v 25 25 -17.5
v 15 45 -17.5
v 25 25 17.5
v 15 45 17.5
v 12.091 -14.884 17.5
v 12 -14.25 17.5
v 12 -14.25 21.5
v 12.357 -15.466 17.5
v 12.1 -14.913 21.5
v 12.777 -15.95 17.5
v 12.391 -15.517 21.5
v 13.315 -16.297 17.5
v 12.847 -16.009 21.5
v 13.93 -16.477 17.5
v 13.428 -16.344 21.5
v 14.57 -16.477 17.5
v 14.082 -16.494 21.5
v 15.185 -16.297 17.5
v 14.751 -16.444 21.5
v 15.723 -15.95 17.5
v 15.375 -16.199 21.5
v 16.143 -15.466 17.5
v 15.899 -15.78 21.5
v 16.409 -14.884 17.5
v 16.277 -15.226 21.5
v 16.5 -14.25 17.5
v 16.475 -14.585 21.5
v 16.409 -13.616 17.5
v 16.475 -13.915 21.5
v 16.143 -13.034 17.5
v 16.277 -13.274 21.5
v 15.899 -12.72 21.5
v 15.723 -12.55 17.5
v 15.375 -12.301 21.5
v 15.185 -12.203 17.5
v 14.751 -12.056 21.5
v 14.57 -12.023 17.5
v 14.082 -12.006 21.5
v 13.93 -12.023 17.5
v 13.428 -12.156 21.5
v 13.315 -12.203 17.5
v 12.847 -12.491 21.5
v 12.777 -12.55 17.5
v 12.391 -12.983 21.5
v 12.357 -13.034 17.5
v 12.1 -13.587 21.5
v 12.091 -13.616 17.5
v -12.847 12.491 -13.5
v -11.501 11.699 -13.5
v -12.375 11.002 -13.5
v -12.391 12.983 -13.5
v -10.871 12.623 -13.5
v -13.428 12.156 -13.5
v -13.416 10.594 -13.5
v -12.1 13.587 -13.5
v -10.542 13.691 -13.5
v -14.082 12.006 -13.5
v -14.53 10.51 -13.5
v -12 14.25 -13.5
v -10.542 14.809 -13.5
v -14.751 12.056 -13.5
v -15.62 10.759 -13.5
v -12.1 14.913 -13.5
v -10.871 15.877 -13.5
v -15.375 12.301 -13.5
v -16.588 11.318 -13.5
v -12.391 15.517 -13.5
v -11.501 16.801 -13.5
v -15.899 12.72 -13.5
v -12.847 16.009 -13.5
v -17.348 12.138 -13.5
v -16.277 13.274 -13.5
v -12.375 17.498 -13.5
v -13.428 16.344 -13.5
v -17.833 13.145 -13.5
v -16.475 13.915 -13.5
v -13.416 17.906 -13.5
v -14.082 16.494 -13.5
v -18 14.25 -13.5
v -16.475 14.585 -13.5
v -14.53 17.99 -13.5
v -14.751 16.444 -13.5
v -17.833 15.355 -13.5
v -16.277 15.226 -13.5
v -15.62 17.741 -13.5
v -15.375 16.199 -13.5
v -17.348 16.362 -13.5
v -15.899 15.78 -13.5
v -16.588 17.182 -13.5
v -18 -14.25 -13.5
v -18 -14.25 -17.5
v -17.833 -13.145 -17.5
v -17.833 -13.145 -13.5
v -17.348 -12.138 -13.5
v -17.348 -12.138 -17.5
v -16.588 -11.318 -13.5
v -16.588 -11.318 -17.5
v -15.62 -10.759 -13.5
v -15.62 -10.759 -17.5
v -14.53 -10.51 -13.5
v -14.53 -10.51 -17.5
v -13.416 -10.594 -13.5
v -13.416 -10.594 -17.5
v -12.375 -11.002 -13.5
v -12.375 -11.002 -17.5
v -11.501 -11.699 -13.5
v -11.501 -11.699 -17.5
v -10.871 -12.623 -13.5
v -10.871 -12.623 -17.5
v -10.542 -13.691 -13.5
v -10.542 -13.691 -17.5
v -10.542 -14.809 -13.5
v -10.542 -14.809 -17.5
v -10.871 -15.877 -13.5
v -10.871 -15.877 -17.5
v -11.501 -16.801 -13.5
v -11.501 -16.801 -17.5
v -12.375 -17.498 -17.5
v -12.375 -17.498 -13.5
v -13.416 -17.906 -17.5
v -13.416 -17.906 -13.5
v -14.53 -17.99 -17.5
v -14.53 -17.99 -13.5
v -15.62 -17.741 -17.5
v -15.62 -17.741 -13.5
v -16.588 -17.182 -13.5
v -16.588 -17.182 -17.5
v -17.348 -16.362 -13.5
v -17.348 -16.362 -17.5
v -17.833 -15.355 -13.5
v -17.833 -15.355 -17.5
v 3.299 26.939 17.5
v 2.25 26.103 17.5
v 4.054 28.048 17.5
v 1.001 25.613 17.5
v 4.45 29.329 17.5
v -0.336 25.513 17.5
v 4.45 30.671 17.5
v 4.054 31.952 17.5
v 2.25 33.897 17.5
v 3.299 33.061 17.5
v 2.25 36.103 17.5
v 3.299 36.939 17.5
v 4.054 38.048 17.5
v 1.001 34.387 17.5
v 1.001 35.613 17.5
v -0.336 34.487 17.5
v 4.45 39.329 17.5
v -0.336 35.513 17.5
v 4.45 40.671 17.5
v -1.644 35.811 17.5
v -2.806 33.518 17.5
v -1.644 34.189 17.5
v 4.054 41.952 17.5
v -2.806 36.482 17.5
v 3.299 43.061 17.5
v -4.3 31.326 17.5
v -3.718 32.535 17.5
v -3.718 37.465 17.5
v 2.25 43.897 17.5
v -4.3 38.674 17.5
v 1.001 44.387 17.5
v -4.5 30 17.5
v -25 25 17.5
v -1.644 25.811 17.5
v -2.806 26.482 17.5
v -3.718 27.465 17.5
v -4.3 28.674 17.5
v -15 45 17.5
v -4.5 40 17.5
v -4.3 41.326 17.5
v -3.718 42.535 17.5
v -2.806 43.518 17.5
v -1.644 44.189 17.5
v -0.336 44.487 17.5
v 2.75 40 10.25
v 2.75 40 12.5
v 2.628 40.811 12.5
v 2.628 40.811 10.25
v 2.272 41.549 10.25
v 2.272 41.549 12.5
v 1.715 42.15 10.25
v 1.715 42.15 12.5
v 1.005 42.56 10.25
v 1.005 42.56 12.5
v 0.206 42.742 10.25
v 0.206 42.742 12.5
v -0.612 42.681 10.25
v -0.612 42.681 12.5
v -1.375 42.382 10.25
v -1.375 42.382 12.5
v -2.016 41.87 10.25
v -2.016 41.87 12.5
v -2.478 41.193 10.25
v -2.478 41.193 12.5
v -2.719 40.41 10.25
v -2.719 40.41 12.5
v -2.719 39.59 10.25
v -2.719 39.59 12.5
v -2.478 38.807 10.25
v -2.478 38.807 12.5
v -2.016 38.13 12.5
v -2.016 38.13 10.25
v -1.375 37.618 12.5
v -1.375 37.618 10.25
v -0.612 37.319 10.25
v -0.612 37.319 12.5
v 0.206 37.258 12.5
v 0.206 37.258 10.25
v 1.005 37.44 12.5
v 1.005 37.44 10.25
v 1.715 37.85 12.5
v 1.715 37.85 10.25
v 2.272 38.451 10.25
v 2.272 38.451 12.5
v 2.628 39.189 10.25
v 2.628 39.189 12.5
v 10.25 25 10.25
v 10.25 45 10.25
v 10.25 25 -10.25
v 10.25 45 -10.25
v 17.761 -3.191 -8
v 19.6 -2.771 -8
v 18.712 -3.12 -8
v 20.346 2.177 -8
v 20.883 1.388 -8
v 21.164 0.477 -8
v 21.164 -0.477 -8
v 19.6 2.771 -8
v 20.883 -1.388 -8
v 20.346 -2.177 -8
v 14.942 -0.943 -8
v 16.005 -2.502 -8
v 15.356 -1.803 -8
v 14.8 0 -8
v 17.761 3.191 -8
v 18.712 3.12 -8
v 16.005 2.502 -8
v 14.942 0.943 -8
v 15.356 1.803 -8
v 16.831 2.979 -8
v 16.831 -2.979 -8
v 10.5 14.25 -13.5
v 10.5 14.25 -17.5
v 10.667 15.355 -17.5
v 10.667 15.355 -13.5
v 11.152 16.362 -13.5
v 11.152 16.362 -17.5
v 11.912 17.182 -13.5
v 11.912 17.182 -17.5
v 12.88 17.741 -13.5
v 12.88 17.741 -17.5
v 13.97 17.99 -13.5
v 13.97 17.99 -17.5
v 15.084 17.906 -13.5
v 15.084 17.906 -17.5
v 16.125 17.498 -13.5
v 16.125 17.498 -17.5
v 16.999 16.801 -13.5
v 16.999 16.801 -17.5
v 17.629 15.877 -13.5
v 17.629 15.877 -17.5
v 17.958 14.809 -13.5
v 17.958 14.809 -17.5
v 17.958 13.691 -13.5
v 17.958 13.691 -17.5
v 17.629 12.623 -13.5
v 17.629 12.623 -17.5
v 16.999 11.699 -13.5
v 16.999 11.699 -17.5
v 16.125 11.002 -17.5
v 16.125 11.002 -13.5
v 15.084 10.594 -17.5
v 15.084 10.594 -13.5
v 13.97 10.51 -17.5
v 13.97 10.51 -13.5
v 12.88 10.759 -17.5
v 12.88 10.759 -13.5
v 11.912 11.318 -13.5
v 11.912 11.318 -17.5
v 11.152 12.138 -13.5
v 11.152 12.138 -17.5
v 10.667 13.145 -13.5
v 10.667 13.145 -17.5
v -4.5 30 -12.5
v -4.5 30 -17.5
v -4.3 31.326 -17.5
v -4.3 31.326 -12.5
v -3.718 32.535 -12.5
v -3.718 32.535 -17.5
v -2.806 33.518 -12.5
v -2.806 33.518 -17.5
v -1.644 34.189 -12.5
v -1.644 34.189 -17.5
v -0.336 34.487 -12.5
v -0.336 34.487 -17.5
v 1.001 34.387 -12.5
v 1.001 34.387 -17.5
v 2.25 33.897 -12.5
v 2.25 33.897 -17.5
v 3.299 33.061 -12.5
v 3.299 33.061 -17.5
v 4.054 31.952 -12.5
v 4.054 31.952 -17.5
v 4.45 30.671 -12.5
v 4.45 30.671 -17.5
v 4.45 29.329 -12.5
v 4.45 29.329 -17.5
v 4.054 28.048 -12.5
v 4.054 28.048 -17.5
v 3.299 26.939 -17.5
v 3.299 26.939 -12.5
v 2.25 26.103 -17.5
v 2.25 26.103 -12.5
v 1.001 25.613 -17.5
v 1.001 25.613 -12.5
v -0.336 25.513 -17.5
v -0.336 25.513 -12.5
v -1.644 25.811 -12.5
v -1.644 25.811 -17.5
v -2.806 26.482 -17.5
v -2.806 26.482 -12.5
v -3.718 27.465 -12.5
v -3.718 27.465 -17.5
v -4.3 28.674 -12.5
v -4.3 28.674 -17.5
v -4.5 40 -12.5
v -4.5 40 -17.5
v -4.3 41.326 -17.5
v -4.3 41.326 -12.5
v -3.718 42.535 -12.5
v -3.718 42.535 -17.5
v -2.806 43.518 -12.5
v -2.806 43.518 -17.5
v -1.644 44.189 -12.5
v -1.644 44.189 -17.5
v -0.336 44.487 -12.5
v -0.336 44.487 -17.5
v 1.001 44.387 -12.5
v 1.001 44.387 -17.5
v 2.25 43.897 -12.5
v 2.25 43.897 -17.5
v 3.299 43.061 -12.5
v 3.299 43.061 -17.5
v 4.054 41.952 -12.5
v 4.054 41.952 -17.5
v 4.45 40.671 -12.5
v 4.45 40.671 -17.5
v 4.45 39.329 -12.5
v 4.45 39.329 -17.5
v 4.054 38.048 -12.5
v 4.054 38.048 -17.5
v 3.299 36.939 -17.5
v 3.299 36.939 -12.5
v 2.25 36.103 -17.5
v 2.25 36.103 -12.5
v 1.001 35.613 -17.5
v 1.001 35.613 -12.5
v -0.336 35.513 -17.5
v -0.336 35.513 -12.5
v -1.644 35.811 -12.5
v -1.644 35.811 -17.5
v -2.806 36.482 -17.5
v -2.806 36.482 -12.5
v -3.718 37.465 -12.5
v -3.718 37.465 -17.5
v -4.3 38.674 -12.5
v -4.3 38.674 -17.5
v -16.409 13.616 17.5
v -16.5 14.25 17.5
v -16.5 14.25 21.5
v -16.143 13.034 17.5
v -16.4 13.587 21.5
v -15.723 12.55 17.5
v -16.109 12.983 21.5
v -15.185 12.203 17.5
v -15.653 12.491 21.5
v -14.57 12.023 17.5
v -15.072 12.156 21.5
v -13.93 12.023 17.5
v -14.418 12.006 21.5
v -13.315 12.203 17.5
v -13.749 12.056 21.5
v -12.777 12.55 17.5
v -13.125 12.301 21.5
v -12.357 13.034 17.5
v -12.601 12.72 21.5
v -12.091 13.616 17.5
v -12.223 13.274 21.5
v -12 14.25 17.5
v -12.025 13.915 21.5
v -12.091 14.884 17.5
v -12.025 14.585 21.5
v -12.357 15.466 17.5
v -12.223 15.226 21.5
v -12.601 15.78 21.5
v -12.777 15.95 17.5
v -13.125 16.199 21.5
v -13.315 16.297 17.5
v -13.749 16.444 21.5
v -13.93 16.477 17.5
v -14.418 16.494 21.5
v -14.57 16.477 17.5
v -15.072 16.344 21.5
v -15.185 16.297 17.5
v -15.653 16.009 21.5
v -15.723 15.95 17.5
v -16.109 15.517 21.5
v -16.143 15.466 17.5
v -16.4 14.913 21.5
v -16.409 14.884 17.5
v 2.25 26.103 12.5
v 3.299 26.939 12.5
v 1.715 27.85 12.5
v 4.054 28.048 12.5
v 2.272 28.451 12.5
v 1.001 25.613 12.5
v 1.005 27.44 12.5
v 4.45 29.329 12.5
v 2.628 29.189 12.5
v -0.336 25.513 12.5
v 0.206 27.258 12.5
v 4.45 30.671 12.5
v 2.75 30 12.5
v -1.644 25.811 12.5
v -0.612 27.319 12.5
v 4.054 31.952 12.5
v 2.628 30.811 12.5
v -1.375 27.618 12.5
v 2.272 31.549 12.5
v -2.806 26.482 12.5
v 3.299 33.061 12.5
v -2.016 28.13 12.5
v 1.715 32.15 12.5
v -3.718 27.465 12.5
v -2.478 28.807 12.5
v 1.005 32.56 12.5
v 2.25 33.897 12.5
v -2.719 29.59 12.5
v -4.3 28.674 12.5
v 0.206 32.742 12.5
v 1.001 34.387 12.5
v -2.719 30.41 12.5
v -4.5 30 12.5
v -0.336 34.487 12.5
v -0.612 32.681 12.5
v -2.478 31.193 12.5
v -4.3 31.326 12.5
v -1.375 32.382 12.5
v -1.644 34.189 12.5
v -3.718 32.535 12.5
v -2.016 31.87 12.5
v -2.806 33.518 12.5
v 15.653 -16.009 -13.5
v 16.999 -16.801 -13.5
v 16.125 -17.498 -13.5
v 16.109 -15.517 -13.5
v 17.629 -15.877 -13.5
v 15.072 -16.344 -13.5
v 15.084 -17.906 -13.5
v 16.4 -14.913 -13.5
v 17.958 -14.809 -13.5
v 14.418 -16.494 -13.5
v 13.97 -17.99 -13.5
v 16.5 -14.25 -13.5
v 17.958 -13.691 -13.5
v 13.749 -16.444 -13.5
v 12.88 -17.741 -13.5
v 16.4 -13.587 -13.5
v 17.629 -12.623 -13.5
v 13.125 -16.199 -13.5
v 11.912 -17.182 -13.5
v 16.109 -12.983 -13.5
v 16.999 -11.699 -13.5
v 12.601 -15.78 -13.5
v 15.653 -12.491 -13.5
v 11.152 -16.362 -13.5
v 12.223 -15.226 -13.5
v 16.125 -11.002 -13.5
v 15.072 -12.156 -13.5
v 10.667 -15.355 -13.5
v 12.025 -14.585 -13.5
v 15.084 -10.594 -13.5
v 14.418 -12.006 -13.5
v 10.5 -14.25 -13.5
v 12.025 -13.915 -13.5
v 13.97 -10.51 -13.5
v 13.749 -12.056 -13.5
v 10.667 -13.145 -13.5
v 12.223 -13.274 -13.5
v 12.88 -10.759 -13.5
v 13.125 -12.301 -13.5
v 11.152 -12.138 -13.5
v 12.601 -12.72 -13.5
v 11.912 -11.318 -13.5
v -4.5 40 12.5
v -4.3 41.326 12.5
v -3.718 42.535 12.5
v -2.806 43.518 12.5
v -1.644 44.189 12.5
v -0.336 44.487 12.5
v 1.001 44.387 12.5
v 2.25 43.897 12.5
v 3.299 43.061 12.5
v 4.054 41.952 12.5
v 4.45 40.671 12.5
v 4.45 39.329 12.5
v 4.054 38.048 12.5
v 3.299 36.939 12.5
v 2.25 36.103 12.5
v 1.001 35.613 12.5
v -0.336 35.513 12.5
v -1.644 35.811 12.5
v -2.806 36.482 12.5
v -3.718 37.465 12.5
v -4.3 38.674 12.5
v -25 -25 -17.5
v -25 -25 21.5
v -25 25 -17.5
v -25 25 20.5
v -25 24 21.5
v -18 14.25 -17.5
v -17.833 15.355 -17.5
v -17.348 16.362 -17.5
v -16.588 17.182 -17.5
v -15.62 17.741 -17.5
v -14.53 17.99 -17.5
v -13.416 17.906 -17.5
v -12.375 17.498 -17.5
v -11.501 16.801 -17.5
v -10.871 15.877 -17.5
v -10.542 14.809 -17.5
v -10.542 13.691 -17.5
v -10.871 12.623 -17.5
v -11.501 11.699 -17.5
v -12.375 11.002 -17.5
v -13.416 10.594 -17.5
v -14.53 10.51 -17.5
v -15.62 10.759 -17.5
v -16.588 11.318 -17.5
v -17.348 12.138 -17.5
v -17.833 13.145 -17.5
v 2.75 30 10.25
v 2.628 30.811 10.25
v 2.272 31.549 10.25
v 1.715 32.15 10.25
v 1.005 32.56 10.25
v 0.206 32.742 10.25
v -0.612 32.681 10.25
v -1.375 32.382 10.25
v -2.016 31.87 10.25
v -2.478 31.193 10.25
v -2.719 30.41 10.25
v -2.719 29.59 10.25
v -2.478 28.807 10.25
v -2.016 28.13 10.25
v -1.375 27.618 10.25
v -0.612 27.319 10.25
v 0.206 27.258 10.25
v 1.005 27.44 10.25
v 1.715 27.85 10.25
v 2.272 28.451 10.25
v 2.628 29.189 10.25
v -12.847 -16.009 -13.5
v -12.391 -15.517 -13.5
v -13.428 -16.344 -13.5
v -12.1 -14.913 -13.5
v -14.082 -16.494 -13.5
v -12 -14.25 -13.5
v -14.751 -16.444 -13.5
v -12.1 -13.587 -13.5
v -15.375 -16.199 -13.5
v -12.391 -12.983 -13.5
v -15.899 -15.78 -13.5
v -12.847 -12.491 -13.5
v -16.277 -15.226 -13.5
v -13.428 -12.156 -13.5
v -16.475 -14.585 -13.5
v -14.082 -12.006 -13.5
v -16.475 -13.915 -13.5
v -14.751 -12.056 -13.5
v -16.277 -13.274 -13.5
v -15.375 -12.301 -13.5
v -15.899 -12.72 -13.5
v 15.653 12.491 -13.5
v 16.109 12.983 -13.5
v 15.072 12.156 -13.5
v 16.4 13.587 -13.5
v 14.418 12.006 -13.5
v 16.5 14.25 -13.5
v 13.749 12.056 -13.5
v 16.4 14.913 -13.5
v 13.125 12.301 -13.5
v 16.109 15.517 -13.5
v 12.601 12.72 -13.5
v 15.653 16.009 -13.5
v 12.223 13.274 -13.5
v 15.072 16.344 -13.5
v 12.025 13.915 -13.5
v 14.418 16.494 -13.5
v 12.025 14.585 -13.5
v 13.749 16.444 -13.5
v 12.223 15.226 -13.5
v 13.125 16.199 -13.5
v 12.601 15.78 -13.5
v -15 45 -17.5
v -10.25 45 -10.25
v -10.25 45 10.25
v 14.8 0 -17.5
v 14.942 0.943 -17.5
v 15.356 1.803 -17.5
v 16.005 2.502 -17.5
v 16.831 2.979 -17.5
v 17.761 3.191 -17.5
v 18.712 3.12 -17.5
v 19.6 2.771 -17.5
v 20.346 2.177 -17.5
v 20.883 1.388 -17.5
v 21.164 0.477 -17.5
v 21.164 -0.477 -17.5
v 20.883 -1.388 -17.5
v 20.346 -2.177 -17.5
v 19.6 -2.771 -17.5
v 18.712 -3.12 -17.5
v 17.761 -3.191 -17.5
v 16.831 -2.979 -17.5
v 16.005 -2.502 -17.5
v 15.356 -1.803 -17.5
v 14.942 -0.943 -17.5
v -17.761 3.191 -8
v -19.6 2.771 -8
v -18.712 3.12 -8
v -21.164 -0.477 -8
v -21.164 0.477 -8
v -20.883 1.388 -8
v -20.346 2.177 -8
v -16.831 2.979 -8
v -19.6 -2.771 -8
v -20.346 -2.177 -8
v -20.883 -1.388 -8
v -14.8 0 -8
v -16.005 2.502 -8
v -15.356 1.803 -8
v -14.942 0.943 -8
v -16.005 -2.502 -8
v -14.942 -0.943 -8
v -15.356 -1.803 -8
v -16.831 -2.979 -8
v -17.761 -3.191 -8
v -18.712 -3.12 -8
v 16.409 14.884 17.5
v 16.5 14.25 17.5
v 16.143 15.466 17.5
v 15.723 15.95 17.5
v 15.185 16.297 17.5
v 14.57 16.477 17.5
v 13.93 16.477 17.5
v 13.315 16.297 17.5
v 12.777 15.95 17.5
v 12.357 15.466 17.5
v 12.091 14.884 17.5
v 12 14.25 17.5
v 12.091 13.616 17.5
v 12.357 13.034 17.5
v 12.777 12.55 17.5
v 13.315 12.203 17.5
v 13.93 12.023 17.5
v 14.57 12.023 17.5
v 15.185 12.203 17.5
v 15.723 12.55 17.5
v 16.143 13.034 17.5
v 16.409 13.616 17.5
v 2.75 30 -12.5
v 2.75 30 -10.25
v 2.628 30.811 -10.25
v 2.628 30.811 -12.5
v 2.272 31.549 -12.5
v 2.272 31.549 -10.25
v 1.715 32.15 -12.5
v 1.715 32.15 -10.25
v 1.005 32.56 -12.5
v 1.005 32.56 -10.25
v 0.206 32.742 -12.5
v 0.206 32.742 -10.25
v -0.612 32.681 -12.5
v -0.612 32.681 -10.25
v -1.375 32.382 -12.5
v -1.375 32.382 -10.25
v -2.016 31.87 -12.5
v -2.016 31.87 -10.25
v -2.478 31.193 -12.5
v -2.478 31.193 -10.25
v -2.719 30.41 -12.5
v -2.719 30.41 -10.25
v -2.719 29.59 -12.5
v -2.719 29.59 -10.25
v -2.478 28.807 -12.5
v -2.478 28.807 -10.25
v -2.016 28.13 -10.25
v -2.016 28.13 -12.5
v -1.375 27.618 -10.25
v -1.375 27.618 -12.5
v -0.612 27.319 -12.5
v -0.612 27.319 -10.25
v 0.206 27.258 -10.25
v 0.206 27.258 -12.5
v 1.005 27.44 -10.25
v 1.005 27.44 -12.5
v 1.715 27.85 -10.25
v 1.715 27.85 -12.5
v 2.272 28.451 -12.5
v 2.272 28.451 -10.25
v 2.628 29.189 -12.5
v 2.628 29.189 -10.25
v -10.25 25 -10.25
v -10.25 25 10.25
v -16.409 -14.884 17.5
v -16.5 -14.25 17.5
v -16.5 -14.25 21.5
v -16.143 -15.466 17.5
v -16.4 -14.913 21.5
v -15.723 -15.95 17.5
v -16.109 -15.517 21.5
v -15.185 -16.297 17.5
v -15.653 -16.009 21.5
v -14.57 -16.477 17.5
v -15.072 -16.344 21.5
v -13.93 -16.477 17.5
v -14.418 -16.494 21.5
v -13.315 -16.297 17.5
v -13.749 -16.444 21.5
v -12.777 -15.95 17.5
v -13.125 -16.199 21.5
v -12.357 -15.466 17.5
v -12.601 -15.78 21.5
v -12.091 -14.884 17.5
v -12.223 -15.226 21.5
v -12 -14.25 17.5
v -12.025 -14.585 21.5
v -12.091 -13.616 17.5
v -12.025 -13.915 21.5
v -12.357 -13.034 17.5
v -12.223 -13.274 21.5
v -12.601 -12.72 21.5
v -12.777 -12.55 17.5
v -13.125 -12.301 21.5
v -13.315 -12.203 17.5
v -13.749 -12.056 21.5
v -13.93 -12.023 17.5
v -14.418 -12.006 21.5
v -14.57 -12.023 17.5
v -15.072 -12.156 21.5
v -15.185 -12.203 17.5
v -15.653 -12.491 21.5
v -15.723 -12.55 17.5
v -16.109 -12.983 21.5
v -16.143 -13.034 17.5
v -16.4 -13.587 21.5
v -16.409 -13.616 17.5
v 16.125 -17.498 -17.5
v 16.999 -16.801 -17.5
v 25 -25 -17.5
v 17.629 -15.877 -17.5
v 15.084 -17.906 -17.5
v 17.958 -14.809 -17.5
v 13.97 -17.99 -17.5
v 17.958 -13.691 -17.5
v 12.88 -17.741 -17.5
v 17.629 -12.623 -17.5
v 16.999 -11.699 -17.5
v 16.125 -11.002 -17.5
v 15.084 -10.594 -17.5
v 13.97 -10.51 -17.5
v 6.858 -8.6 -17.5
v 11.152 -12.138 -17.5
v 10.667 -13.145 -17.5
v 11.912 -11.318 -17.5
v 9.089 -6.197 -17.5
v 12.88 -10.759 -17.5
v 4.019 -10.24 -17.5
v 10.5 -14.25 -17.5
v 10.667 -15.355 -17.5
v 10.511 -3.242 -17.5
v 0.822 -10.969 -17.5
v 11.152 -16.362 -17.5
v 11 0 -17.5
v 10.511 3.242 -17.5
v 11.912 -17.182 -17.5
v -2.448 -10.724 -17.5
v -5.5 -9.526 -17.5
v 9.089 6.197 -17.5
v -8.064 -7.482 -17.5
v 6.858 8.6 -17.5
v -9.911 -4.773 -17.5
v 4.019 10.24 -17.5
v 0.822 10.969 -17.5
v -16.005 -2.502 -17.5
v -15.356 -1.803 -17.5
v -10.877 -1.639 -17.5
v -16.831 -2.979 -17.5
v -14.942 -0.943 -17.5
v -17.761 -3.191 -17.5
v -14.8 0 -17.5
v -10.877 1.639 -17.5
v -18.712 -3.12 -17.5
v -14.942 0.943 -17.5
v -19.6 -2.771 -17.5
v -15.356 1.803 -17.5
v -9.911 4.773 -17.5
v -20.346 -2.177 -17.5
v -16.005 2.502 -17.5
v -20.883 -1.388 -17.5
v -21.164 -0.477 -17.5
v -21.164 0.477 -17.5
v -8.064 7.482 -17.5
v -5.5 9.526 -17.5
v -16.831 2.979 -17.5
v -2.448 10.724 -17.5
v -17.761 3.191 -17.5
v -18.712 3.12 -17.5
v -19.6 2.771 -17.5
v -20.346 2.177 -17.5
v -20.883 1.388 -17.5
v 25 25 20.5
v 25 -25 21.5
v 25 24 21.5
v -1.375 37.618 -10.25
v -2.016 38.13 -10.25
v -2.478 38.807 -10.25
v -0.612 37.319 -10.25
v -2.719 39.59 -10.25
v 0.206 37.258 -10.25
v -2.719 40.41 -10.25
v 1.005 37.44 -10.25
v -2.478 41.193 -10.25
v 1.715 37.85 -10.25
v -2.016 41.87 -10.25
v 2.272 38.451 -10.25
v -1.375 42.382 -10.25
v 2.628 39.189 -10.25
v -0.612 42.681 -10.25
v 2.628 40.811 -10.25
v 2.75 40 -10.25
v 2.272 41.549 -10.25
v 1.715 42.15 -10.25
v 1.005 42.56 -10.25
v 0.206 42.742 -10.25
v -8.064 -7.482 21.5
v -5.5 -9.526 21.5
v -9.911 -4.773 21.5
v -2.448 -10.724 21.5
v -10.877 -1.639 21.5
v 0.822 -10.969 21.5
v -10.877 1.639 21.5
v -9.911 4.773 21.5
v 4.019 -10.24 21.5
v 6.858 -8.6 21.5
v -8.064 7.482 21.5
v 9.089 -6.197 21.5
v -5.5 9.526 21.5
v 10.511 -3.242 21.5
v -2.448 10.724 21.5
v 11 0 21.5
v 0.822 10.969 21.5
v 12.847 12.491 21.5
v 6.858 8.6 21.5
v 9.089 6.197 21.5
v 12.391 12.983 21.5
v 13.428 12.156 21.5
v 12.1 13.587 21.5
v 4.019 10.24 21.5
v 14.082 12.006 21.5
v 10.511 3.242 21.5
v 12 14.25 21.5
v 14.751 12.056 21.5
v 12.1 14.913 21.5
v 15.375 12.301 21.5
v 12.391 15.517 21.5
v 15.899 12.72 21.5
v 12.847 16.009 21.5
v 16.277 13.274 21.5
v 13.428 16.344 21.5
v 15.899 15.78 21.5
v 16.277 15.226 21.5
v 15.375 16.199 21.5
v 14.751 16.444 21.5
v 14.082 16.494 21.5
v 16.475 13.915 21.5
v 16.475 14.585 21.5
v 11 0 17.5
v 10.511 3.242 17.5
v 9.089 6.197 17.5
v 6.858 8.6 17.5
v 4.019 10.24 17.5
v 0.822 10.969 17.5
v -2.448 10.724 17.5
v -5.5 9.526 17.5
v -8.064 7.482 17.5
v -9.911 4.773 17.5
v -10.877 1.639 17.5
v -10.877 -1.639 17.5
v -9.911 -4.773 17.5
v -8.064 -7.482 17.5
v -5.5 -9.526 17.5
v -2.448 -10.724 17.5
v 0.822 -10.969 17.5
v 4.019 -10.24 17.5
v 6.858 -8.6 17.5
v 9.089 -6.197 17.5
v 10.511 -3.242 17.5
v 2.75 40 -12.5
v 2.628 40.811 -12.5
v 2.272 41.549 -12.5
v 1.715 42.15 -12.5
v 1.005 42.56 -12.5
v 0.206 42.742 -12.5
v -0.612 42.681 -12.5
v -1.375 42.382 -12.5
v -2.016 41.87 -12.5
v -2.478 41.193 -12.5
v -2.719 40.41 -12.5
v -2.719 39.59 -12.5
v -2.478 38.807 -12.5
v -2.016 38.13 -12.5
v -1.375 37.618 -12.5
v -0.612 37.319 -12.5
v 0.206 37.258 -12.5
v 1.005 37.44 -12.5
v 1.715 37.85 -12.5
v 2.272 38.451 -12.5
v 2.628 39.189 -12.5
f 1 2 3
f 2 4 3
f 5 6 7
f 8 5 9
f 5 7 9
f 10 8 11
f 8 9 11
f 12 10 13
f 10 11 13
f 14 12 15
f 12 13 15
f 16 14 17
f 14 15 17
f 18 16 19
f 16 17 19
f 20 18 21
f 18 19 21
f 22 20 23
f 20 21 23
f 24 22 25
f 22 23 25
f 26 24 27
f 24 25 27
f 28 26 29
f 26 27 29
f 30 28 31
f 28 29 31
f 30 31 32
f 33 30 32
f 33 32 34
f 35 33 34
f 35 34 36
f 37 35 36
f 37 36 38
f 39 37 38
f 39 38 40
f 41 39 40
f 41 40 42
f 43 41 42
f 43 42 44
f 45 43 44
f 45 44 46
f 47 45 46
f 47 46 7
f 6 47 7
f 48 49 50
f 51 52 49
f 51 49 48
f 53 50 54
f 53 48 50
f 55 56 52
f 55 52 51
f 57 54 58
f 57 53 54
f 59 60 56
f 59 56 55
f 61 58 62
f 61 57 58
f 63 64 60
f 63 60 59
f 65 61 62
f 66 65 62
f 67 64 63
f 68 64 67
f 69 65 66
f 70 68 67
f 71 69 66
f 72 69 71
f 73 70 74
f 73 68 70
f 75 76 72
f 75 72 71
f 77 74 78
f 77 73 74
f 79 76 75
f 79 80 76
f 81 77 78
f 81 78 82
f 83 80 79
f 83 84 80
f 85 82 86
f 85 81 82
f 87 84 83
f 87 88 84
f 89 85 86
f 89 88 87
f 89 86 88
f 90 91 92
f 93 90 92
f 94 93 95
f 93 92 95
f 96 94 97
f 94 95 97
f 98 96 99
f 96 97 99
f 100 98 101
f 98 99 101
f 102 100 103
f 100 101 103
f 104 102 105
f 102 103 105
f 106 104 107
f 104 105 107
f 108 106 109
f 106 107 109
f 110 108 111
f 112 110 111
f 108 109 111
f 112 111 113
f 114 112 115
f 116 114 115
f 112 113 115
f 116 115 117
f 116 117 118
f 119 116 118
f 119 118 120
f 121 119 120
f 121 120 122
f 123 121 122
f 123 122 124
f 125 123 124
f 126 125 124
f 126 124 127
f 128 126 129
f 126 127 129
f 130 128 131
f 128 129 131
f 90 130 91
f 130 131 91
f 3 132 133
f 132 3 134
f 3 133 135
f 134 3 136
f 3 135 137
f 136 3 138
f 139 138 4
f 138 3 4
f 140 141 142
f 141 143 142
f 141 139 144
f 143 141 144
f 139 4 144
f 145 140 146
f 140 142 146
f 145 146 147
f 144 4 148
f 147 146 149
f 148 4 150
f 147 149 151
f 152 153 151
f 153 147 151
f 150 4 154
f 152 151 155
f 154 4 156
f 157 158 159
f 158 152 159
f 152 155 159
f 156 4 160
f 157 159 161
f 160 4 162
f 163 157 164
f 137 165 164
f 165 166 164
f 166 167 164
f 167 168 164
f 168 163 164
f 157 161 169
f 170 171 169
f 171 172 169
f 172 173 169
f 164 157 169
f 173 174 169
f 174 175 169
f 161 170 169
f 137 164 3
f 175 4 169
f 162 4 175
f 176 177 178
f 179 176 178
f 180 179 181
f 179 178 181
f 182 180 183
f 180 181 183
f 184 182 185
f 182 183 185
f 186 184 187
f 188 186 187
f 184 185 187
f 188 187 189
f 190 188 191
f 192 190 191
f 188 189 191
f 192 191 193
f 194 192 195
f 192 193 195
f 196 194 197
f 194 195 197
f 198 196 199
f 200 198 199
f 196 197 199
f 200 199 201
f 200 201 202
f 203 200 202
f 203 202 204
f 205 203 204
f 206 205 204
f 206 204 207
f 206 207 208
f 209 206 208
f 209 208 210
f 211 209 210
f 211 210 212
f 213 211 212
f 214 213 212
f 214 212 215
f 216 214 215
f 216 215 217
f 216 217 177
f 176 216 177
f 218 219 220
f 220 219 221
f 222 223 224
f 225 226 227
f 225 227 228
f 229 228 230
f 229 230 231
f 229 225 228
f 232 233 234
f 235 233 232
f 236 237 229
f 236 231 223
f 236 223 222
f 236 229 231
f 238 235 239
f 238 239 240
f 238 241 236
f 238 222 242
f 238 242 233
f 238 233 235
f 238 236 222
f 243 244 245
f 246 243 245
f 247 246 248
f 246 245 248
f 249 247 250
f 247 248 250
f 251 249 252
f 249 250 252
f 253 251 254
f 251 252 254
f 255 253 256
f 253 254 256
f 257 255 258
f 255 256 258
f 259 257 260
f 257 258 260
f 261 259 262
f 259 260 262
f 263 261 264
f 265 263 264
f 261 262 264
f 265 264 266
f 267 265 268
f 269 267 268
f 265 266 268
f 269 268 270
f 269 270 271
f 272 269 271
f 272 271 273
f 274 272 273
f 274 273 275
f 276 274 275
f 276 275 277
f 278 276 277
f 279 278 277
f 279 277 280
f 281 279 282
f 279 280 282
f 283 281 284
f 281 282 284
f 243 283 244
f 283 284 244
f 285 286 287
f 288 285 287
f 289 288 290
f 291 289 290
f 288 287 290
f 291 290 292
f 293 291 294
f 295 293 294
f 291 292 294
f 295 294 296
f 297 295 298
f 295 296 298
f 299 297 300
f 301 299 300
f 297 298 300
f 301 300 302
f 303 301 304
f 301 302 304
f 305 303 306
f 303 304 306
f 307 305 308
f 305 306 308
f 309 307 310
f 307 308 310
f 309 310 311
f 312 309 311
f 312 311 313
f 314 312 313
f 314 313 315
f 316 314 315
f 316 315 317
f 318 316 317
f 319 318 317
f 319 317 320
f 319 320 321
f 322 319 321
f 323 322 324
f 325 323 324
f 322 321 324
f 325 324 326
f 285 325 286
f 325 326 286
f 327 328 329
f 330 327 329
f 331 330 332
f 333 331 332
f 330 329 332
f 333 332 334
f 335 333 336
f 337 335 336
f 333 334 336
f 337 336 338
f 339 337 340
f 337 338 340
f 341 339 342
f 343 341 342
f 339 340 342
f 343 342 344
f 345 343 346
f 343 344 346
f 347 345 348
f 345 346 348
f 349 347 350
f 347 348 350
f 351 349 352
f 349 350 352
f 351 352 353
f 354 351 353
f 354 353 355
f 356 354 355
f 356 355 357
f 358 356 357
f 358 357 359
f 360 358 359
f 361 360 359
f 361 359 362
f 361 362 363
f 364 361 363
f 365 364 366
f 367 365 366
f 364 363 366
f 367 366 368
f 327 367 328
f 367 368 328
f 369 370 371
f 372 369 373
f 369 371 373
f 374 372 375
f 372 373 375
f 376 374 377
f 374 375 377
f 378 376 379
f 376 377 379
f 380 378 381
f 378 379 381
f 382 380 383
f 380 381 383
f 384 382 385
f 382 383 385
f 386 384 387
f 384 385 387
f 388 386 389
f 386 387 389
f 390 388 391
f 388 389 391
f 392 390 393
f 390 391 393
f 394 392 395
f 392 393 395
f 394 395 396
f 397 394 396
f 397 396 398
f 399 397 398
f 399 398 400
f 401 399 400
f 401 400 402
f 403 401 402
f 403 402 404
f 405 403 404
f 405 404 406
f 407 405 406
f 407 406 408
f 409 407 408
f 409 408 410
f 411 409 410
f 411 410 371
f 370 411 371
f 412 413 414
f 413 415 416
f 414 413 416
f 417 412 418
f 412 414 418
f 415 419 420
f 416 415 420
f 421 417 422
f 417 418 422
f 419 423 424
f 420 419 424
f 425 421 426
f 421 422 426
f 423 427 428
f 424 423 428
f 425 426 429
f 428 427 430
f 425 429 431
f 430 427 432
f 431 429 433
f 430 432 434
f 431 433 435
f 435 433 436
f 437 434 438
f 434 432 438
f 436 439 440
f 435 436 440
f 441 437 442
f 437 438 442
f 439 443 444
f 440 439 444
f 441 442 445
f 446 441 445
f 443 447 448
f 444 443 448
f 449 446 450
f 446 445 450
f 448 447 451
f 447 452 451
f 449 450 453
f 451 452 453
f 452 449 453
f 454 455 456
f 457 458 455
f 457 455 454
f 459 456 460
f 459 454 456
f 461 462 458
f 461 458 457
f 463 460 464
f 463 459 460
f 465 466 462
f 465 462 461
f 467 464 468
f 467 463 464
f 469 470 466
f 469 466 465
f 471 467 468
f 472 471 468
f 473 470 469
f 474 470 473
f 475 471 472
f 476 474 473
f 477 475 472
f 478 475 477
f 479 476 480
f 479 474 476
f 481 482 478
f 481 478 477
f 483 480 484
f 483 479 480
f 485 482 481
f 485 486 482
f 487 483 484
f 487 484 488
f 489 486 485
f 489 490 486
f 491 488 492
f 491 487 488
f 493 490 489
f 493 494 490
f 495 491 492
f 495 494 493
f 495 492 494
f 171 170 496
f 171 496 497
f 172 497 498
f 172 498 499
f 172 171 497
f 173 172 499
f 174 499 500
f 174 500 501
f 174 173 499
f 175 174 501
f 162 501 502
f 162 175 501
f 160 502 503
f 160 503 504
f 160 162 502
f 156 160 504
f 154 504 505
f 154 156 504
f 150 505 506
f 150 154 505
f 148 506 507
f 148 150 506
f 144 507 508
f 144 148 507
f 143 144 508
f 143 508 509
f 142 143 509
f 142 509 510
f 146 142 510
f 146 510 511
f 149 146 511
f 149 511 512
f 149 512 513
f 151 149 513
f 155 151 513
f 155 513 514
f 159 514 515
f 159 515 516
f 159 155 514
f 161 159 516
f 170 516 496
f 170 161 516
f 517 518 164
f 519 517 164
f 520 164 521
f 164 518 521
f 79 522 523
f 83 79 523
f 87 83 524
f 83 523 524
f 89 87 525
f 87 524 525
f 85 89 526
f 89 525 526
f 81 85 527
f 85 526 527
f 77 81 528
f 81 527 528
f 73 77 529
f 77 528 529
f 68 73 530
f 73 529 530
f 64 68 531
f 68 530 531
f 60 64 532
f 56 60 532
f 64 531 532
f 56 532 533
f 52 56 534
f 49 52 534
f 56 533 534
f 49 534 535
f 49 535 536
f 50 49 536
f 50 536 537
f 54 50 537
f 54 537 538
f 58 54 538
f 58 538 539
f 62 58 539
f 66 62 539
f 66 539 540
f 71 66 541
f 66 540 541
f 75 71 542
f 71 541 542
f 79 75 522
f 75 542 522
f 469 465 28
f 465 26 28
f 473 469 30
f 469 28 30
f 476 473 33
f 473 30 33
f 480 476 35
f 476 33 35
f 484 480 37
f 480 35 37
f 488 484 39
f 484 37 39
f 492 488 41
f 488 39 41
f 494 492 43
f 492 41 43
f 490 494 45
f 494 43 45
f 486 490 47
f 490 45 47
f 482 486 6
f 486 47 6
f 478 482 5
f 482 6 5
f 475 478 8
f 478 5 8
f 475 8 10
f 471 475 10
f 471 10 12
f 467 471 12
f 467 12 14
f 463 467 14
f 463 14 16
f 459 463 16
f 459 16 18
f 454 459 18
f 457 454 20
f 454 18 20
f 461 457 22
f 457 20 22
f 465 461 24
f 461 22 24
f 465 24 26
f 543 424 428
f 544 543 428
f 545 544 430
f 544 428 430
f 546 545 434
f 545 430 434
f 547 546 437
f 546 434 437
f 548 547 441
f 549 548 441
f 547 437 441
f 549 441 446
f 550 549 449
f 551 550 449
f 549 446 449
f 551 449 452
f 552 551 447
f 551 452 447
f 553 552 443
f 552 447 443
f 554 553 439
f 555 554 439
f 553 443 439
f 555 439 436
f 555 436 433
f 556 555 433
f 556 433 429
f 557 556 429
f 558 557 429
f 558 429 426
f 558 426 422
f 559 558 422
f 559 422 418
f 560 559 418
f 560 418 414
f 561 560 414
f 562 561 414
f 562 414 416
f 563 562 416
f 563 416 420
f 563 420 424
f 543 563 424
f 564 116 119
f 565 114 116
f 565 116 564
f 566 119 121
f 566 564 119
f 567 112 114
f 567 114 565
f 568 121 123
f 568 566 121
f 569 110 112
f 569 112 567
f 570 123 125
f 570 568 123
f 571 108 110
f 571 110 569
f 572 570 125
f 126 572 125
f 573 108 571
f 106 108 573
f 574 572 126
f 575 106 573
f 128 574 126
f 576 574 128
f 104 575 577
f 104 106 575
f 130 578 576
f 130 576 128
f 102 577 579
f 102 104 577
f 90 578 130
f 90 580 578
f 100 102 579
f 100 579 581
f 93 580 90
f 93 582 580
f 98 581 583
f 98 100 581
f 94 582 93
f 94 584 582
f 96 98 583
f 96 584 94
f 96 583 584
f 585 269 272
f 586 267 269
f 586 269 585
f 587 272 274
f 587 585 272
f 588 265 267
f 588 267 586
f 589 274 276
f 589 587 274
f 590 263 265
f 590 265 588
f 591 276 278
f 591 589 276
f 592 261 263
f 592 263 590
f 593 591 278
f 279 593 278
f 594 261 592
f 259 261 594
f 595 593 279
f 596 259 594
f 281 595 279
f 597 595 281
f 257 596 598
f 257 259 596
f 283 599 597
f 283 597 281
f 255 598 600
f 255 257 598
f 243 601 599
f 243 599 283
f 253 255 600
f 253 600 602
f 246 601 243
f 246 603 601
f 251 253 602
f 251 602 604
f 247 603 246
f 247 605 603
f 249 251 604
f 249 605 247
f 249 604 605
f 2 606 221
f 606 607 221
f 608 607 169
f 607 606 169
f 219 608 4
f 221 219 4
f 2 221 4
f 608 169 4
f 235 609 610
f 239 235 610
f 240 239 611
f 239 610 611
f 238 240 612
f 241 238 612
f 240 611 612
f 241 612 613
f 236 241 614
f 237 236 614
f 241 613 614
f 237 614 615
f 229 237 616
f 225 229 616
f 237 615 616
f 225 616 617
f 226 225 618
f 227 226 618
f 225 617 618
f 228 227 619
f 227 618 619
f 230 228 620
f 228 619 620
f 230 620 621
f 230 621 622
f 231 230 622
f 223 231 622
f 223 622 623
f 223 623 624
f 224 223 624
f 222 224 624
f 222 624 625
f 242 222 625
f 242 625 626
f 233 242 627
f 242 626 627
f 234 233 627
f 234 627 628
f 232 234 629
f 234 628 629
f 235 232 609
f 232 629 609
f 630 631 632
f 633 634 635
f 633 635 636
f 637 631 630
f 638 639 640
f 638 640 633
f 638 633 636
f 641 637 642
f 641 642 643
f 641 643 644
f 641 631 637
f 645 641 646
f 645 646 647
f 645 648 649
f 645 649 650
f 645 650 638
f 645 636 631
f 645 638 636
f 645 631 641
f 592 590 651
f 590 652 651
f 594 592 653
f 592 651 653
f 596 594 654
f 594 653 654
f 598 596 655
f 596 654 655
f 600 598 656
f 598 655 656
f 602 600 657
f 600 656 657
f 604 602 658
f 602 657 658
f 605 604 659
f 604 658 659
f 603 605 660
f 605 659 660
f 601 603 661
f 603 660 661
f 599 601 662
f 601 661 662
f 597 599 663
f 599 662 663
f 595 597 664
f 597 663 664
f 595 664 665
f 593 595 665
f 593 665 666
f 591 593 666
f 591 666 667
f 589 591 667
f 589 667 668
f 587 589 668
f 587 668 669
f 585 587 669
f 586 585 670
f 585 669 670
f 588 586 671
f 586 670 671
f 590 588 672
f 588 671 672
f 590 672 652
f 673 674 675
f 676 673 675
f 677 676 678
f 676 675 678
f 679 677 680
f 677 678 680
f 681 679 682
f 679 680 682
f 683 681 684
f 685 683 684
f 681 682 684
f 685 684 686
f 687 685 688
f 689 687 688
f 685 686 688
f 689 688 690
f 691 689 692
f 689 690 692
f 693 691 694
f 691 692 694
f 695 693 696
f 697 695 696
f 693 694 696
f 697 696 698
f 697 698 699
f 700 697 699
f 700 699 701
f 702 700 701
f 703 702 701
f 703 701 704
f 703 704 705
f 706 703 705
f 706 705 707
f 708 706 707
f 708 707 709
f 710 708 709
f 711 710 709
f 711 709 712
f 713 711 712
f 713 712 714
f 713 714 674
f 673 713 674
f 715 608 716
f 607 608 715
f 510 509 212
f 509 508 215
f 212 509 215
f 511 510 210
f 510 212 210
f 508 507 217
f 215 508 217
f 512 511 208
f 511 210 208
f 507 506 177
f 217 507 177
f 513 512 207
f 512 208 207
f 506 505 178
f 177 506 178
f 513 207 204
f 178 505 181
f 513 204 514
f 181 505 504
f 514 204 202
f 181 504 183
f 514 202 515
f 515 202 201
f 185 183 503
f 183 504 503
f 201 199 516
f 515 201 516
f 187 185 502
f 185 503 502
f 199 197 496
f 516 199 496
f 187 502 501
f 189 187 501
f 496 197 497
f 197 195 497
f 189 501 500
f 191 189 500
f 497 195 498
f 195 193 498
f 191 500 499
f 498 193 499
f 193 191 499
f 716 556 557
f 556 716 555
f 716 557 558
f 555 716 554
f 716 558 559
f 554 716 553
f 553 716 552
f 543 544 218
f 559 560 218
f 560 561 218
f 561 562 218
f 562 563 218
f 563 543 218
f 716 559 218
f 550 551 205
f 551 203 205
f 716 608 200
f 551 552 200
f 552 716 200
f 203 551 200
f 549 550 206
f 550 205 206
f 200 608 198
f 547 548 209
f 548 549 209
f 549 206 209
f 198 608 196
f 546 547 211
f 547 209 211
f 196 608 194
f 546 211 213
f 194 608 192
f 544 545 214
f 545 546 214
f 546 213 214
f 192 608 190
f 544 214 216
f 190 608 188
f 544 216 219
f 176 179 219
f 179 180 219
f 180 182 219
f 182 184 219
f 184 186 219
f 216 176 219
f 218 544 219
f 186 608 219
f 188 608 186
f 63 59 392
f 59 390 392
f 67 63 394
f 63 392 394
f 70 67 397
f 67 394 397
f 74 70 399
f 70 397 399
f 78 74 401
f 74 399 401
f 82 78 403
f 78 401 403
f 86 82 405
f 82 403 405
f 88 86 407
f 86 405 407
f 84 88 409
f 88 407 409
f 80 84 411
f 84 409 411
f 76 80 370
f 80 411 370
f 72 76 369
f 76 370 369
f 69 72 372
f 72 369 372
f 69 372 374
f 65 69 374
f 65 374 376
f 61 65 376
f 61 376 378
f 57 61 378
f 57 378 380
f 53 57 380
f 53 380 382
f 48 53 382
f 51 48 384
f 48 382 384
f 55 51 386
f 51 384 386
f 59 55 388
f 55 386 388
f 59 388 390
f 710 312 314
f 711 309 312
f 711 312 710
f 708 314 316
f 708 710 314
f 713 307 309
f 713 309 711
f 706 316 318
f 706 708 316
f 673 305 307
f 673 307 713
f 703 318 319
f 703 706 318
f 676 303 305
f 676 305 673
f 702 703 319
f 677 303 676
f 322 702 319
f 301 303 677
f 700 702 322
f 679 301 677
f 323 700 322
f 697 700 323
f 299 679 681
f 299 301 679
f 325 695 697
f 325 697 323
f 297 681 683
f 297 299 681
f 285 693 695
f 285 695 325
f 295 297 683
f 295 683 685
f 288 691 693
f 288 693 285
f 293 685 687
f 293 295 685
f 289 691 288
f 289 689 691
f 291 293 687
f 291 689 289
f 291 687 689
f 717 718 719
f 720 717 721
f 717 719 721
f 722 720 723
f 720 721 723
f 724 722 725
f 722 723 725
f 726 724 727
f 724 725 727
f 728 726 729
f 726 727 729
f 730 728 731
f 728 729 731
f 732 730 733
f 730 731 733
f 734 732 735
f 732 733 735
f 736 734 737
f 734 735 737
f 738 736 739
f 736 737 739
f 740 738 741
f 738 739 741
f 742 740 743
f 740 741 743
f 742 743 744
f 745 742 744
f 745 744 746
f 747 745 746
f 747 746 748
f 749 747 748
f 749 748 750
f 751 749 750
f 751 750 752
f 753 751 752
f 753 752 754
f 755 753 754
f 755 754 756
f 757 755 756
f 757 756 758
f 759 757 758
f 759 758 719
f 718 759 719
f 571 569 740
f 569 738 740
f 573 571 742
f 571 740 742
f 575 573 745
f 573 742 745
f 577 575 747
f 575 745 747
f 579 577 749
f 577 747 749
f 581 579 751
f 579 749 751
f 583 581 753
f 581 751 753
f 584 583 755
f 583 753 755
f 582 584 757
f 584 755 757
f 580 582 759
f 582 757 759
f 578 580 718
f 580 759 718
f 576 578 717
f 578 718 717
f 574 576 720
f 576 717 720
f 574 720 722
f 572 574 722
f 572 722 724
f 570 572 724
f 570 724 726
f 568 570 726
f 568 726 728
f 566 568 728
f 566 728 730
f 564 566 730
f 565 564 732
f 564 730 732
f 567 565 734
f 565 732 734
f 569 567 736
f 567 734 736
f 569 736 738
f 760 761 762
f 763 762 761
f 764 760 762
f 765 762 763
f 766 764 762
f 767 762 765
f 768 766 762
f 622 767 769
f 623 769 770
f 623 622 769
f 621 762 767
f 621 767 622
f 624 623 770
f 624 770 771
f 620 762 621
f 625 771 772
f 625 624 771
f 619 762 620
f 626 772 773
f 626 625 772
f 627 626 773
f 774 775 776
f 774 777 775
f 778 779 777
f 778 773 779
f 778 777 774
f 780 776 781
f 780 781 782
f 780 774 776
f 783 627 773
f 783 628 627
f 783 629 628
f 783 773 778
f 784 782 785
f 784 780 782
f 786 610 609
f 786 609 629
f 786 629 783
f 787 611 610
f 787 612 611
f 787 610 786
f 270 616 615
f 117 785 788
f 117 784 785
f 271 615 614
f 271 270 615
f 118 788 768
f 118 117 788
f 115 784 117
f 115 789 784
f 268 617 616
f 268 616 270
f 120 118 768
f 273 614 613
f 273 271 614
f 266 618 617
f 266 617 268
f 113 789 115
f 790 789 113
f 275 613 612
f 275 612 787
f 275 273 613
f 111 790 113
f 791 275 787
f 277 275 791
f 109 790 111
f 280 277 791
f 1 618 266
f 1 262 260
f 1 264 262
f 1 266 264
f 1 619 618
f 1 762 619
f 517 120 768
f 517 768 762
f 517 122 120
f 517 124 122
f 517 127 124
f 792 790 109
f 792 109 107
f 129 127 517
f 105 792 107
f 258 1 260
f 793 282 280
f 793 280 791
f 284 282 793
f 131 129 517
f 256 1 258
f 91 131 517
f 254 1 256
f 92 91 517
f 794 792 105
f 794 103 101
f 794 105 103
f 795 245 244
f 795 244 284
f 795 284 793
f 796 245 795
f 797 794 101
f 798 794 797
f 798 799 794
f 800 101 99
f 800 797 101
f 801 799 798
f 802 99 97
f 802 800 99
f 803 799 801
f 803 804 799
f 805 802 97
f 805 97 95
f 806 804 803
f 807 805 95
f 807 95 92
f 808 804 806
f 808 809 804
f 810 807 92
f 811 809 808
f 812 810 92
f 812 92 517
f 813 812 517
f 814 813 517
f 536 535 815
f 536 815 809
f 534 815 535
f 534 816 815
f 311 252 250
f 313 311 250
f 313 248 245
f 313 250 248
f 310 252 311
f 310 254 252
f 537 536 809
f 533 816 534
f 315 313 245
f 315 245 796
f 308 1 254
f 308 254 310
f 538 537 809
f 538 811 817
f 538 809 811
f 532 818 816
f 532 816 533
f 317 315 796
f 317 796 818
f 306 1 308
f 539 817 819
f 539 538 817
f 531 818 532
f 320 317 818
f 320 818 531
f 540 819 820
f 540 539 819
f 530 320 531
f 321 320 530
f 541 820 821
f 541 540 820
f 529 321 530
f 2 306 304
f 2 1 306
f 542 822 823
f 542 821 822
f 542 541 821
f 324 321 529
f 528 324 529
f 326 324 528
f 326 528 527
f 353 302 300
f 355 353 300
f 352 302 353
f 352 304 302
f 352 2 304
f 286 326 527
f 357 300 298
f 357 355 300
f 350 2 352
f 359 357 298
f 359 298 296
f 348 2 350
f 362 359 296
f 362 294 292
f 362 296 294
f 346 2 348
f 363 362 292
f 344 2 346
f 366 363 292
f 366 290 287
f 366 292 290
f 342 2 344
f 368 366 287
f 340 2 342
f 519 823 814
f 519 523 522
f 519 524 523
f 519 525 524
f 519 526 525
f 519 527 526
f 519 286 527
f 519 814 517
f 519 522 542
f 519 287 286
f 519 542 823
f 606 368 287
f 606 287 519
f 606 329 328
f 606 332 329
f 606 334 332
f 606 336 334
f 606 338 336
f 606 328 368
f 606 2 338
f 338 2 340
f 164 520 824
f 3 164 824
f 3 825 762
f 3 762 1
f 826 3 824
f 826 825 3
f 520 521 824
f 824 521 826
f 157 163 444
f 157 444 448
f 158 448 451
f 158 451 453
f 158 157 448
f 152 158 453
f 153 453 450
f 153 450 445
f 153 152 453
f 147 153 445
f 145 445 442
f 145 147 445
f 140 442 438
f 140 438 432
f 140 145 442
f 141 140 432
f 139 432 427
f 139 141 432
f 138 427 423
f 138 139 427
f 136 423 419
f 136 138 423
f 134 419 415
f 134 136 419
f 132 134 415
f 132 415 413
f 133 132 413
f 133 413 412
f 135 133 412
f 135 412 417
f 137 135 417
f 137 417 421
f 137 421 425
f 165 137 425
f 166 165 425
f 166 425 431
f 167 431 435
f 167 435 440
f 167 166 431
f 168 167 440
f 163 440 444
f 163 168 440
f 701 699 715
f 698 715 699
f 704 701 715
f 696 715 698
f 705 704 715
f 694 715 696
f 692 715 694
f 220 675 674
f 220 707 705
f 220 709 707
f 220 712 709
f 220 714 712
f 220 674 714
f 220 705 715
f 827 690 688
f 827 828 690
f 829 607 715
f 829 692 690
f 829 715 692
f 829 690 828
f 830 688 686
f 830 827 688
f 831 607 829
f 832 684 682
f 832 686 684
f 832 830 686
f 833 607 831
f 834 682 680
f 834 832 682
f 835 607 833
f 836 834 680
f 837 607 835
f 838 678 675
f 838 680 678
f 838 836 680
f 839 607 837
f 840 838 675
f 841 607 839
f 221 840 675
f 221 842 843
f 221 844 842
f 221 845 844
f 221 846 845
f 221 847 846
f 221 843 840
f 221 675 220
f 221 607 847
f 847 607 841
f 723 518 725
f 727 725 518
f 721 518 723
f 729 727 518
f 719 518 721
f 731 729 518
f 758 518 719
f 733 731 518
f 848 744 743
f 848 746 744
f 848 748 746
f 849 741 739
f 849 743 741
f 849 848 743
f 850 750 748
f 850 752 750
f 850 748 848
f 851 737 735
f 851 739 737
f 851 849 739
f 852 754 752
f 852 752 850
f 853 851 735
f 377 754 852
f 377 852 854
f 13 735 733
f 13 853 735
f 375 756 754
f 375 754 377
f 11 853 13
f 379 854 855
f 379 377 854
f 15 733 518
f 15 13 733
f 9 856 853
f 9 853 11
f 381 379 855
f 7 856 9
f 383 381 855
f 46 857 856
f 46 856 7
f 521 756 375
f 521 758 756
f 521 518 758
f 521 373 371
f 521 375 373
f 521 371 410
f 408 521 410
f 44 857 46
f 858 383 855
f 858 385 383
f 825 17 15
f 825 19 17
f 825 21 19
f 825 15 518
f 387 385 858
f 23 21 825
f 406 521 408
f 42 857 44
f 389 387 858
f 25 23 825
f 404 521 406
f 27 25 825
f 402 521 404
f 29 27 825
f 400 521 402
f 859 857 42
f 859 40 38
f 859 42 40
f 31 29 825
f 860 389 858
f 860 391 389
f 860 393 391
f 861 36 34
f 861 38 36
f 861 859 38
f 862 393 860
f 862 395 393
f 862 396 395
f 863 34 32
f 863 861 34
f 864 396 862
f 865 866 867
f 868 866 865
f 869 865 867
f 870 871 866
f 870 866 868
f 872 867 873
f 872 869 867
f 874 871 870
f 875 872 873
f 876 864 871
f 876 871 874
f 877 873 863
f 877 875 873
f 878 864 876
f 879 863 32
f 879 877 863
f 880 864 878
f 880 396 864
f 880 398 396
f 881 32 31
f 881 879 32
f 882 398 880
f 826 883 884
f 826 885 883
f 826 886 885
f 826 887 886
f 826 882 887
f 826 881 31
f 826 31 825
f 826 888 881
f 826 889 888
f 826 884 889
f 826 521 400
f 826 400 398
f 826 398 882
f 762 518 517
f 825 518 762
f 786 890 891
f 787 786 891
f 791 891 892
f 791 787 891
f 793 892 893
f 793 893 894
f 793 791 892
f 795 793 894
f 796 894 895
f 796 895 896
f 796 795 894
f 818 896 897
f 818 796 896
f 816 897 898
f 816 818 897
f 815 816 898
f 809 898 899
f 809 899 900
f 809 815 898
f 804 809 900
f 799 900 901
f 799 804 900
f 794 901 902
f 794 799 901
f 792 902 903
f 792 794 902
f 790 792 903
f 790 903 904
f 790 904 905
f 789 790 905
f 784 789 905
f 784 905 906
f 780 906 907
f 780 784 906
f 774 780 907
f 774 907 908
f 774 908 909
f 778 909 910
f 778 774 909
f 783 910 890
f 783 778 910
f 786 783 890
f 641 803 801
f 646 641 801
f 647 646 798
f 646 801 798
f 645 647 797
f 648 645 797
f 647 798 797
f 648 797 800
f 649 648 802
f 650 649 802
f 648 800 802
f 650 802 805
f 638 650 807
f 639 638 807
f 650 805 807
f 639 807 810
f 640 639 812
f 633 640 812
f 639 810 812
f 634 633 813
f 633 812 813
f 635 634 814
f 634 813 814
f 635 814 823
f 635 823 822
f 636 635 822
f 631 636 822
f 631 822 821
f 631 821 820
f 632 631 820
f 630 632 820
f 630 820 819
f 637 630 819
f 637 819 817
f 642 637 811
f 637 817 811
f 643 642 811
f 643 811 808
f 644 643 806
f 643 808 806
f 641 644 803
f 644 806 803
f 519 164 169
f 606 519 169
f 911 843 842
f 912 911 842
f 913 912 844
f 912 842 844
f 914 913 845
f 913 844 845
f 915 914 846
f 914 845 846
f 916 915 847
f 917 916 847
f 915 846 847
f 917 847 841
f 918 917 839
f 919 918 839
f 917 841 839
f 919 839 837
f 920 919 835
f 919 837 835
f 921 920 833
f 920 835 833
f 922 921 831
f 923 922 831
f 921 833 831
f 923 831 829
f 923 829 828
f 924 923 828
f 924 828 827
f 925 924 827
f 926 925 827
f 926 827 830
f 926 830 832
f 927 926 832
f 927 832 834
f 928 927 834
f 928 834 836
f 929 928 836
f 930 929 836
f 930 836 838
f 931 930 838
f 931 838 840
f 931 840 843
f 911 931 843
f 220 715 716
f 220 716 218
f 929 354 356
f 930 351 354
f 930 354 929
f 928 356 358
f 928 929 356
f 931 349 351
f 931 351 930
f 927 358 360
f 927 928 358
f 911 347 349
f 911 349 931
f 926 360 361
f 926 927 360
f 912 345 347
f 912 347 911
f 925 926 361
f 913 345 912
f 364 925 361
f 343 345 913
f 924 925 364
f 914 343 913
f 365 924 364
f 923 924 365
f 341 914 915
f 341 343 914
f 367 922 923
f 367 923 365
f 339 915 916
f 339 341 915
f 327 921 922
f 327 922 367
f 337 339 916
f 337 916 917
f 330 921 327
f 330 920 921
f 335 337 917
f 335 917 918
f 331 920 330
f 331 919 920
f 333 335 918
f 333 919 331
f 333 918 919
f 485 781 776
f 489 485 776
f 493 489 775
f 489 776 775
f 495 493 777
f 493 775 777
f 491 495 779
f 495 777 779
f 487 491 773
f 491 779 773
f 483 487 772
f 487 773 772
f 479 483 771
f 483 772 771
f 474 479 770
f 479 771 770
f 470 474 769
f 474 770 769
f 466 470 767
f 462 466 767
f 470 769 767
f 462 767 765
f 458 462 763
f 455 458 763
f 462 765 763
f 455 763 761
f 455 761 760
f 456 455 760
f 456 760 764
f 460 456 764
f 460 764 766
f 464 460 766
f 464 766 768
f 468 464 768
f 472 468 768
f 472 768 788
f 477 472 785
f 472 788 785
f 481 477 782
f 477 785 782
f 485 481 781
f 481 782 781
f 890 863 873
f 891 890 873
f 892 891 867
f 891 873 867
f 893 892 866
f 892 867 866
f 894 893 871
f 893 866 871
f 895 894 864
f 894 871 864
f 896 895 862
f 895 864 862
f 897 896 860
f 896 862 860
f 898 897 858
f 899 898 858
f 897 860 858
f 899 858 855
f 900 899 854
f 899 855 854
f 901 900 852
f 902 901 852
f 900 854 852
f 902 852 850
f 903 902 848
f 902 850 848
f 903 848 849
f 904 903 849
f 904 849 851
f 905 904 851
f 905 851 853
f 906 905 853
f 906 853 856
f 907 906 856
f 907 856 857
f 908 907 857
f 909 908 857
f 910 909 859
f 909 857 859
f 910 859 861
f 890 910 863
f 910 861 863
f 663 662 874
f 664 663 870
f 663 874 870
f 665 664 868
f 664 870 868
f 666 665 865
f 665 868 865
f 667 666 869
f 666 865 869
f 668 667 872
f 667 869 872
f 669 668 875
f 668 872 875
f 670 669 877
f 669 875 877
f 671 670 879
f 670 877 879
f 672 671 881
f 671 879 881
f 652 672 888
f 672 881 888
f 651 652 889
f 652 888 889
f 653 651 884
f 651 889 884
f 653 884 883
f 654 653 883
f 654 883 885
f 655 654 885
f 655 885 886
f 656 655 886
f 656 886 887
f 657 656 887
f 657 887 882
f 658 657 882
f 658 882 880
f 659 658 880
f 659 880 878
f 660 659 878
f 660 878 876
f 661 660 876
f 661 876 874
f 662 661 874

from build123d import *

# Parameters (mm, degrees)
SKETCH1_R            = 11
BODY_DEPTH           = 17.5
SKETCH4_W            = 20.5
SKETCH4_H            = 20.5
PROFIL_HOLE_DEPTH    = 20
M4_CLEARANCE_HOLE1_D = 4.5
M5_CLEARANCE_HOLE1_D = 5.5
ELEVATION_START      = 4
SKETCH10_W           = 50
SKETCH10_H           = 50
SKETCH10_R           = 2.25
SKETCH10_R_2         = 11
ELEVATION_DEPTH      = 4
SKETCH11_R           = 3.2
INSERTS_HOLES_DEPTH  = 9.5
SKETCH12_R           = 4.5
M5_VIS_PLACE_DEPTH   = 5
SKETCH13_R           = 3.75
M4_SCREW_PLACE_DEPTH = 4
CHAMFER1_SIZE        = 1


with BuildPart() as part:
    # Sketch1 → Body (new, symmetric)
    with BuildSketch(Plane.XY):
        Polygon((-25, 25), (-15, 45), (15, 45), (25, 25), (25, -25), (-25, -25), align=None)
        Circle(SKETCH1_R, mode=Mode.SUBTRACT)
    extrude(amount=BODY_DEPTH, both=True)

    # Sketch4 → Profil_Hole (cut)
    with BuildSketch(Plane(origin=(0, 45, 0), x_dir=(1, 0, 0), z_dir=(0, 1, 0))):
        Rectangle(SKETCH4_W, SKETCH4_H)
    extrude(amount=-PROFIL_HOLE_DEPTH, mode=Mode.SUBTRACT)

    # M4 Clearance Hole1 (through all)
    with Locations(Plane(origin=(0, 0, -17.5), x_dir=(-1, 0, 0), z_dir=(0, 0, -1))):
        with Locations((0, 0), (-14.25, 14.25), (14.25, -14.25), (14.25, 14.25), (-14.25, -14.25)):
            Hole(M4_CLEARANCE_HOLE1_D / 2)

    # M5 Clearance Hole1 (through all)
    with Locations(Plane(origin=(0, 0, -17.5), x_dir=(-1, 0, 0), z_dir=(0, 0, -1))):
        with Locations((0, 40), (0, 30)):
            Hole(M5_CLEARANCE_HOLE1_D / 2)

    # Sketch10 → Elevation (add)
    with BuildSketch(Plane.XY.offset(17.5).offset(ELEVATION_START)):
        Rectangle(SKETCH10_W, SKETCH10_H)
        with Locations(Location((-14.25, -14.25, 0), (0, 0, 180))):
            Circle(SKETCH10_R, mode=Mode.SUBTRACT)
        with Locations(Location((14.25, -14.25, 0), (0, 0, 180))):
            Circle(SKETCH10_R, mode=Mode.SUBTRACT)
        with Locations(Location((14.25, 14.25, 0), (0, 0, 180))):
            Circle(SKETCH10_R, mode=Mode.SUBTRACT)
        Circle(SKETCH10_R_2, mode=Mode.SUBTRACT)
        with Locations(Location((-14.25, 14.25, 0), (0, 0, 180))):
            Circle(SKETCH10_R, mode=Mode.SUBTRACT)
    extrude(amount=-ELEVATION_DEPTH)

    # Sketch11 → Inserts_Holes (cut)
    with BuildSketch(Plane(origin=(0, 0, -17.5), x_dir=(-1, 0, 0), z_dir=(0, 0, -1))):
        with Locations((-18, 0)):
            Circle(SKETCH11_R)
        with Locations(Location((18, 0, 0), (0, 0, 180))):
            Circle(SKETCH11_R)
    extrude(amount=-INSERTS_HOLES_DEPTH, mode=Mode.SUBTRACT)

    # Sketch12 → M5_Vis_Place (cut)
    with BuildSketch(Plane(origin=(0, 0, -17.5), x_dir=(-1, 0, 0), z_dir=(0, 0, -1))):
        with Locations((0, 40)):
            Circle(SKETCH12_R)
        with Locations((0, 30)):
            Circle(SKETCH12_R)
    m5_vis_place = extrude(amount=-M5_VIS_PLACE_DEPTH, mode=Mode.SUBTRACT)

    # Mirror1: M5_Vis_Place across plane
    add(m5_vis_place.mirror(Plane.XY), mode=Mode.SUBTRACT)

    # Sketch13 → M4_Screw_Place (cut)
    with BuildSketch(Plane(origin=(0, 0, -17.5), x_dir=(-1, 0, 0), z_dir=(0, 0, -1))):
        with Locations((-14.25, 14.25)):
            Circle(SKETCH13_R)
        with Locations((14.25, 14.25)):
            Circle(SKETCH13_R)
        with Locations((14.25, -14.25)):
            Circle(SKETCH13_R)
        with Locations((-14.25, -14.25)):
            Circle(SKETCH13_R)
    extrude(amount=-M4_SCREW_PLACE_DEPTH, mode=Mode.SUBTRACT)

    # Chamfer1
    chamfer1_edges = [part.edges().sort_by_distance(p)[0] for p in [
        (0, 25, 21.5),
    ]]
    chamfer(chamfer1_edges, length=CHAMFER1_SIZE)


solid = part.part
